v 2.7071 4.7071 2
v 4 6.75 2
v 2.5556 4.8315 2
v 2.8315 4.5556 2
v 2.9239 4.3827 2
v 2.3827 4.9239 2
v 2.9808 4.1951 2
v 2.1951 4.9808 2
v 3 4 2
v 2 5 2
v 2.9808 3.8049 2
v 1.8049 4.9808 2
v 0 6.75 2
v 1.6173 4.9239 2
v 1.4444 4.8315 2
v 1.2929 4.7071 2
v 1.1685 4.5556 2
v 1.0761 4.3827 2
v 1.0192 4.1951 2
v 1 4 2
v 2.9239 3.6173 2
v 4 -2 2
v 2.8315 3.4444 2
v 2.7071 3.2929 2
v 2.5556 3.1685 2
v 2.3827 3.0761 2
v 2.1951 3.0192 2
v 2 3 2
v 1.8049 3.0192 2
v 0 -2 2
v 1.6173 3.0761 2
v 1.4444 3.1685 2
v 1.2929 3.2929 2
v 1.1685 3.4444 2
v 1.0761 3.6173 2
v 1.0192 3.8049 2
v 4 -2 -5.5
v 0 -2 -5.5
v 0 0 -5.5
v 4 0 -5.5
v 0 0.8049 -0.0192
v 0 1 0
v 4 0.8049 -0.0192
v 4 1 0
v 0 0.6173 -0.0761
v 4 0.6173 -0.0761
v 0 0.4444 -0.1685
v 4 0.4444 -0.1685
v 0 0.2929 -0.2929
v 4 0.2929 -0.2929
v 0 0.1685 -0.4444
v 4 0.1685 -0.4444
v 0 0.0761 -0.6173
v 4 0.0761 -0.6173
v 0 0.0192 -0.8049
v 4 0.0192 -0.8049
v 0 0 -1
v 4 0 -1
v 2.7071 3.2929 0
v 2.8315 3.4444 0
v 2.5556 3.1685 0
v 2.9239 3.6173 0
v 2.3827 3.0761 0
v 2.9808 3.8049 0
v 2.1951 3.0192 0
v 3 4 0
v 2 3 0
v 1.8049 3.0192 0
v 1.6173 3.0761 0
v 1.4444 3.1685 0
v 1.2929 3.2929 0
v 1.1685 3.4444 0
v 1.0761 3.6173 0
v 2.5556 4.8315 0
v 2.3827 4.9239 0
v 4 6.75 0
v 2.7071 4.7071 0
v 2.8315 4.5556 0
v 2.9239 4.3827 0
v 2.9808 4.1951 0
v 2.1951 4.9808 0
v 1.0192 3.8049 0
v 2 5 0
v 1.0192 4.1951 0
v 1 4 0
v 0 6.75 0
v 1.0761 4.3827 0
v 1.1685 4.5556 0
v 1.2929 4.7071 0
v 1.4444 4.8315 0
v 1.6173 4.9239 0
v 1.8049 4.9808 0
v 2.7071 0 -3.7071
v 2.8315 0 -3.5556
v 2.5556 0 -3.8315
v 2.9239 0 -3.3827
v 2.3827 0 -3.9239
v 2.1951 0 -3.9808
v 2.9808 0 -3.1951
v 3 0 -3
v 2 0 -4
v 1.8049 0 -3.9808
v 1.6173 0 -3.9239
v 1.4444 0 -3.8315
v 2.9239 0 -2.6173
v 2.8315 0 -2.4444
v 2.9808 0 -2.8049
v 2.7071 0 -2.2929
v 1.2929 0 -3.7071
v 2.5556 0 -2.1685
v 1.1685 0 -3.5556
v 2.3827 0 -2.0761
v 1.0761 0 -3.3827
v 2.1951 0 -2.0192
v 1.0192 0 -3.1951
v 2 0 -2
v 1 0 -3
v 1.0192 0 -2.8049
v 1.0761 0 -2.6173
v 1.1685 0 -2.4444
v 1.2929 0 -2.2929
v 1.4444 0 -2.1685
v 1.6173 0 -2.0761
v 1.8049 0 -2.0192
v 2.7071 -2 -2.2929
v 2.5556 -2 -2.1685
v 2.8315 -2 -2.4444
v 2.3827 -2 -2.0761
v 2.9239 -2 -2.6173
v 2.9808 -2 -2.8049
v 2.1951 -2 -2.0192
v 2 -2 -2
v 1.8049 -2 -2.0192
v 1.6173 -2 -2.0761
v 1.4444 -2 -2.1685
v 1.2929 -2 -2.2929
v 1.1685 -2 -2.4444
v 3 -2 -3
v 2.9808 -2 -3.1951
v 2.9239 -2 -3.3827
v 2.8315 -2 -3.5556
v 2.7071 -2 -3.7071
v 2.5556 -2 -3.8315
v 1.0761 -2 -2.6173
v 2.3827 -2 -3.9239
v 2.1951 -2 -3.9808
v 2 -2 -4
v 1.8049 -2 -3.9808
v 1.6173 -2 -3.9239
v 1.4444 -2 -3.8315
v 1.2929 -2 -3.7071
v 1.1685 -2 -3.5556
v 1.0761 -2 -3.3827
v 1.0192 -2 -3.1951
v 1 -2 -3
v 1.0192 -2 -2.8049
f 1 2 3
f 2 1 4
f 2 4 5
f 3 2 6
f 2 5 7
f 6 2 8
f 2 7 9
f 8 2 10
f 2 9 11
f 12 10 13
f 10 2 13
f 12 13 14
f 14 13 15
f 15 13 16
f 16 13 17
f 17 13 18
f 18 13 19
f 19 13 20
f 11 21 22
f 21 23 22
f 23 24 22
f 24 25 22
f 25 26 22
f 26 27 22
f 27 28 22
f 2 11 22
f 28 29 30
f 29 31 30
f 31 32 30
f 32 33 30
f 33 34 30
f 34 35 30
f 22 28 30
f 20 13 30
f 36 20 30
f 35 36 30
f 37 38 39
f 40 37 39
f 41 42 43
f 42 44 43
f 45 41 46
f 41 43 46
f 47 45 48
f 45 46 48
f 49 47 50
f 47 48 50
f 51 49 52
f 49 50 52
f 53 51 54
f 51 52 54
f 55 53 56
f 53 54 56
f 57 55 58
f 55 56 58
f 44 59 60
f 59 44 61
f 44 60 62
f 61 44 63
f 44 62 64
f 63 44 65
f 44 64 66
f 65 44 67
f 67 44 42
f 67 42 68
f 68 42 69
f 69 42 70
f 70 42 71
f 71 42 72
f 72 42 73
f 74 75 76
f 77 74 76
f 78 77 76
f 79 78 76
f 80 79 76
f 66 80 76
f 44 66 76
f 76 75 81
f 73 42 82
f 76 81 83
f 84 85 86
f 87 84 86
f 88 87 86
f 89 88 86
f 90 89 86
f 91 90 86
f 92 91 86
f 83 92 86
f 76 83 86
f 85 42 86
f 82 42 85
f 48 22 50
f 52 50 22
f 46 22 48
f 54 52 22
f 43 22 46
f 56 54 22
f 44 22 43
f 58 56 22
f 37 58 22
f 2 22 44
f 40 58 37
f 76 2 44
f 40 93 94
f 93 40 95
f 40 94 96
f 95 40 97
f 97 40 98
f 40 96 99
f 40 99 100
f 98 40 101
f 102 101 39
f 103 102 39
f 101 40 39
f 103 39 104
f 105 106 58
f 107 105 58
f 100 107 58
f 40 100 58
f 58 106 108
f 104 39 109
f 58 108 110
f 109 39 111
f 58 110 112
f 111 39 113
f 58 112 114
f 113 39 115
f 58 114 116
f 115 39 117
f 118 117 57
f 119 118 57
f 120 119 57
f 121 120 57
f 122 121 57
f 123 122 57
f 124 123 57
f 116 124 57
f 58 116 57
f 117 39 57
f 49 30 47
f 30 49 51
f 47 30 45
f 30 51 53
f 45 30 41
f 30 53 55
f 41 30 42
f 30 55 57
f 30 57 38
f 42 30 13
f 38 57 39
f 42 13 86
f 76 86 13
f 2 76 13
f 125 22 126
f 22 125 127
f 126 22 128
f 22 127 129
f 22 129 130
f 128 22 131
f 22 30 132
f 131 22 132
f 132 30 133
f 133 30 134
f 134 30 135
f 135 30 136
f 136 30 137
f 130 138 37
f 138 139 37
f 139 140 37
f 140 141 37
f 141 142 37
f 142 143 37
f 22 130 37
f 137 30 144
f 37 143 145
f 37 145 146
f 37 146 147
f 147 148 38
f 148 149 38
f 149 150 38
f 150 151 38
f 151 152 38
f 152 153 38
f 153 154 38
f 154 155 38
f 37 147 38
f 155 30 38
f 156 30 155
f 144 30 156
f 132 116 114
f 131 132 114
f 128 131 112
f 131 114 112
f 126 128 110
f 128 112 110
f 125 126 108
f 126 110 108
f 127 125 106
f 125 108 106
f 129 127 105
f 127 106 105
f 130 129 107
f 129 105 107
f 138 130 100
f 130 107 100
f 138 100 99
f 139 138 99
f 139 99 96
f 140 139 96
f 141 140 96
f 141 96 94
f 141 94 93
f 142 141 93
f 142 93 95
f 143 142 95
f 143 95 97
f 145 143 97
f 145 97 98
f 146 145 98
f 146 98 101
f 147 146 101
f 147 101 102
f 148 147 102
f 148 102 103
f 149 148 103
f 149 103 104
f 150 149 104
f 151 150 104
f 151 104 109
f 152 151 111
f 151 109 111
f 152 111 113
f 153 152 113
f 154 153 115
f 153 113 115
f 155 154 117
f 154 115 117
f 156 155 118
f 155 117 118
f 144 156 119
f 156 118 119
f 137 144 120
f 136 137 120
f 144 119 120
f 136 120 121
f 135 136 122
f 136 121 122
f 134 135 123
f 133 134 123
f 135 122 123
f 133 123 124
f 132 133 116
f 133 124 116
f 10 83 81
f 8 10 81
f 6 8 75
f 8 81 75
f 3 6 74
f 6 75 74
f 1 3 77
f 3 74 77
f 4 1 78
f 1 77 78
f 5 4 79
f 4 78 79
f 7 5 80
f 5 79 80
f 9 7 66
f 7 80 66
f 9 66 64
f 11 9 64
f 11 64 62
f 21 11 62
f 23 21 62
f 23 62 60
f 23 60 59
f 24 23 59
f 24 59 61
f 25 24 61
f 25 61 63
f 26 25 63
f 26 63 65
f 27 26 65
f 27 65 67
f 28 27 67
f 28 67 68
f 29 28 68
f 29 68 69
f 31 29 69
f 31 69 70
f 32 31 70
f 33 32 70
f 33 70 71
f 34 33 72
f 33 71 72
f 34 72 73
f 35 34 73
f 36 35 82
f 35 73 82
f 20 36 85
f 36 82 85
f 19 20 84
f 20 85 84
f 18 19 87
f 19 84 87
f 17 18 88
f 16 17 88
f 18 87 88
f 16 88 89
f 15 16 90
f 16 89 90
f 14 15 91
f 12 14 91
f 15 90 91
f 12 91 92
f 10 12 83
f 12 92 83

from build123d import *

# Parameters (mm, degrees)
BOSS_EXTRUDE1_DEPTH = 4
SKETCH2_R           = 1
CUT_EXTRUDE1_DEPTH  = 10.581883948
SKETCH3_R           = 1
CUT_EXTRUDE2_DEPTH  = 10.581883948
FILLET1_R           = 1


with BuildPart() as part:
    # Sketch1 → Boss-Extrude1 (new body)
    with BuildSketch(Plane(origin=(0, 0, 0), x_dir=(0, 0, -1), z_dir=(1, 0, 0))):
        Polygon((0, 0), (0, 6.75), (-2, 6.75), (-2, -2), (5.5, -2), (5.5, 0), align=None)
    extrude(amount=BOSS_EXTRUDE1_DEPTH)

    # Sketch2 → Cut-Extrude1 (cut, through all)
    with BuildSketch(Plane(origin=(0, 0, 0), x_dir=(-1, 0, 0), z_dir=(0, 0, -1))):
        with Locations(Location((-2, 4, 0), (0, 0, 90))):
            Circle(SKETCH2_R)
    extrude(amount=-CUT_EXTRUDE1_DEPTH, mode=Mode.SUBTRACT)

    # Sketch3 → Cut-Extrude2 (cut, through all)
    with BuildSketch(Plane(origin=(0, 0, 0), x_dir=(1, 0, 0), z_dir=(0, 1, 0))):
        with Locations(Location((2, 3, 0), (0, 0, 270))):
            Circle(SKETCH3_R)
    extrude(amount=-CUT_EXTRUDE2_DEPTH, mode=Mode.SUBTRACT)

    # Fillet1
    fillet1_edges = [part.edges().sort_by_distance(p)[0] for p in [
        (2, 0, 0),
    ]]
    fillet(fillet1_edges, radius=FILLET1_R)


solid = part.part
